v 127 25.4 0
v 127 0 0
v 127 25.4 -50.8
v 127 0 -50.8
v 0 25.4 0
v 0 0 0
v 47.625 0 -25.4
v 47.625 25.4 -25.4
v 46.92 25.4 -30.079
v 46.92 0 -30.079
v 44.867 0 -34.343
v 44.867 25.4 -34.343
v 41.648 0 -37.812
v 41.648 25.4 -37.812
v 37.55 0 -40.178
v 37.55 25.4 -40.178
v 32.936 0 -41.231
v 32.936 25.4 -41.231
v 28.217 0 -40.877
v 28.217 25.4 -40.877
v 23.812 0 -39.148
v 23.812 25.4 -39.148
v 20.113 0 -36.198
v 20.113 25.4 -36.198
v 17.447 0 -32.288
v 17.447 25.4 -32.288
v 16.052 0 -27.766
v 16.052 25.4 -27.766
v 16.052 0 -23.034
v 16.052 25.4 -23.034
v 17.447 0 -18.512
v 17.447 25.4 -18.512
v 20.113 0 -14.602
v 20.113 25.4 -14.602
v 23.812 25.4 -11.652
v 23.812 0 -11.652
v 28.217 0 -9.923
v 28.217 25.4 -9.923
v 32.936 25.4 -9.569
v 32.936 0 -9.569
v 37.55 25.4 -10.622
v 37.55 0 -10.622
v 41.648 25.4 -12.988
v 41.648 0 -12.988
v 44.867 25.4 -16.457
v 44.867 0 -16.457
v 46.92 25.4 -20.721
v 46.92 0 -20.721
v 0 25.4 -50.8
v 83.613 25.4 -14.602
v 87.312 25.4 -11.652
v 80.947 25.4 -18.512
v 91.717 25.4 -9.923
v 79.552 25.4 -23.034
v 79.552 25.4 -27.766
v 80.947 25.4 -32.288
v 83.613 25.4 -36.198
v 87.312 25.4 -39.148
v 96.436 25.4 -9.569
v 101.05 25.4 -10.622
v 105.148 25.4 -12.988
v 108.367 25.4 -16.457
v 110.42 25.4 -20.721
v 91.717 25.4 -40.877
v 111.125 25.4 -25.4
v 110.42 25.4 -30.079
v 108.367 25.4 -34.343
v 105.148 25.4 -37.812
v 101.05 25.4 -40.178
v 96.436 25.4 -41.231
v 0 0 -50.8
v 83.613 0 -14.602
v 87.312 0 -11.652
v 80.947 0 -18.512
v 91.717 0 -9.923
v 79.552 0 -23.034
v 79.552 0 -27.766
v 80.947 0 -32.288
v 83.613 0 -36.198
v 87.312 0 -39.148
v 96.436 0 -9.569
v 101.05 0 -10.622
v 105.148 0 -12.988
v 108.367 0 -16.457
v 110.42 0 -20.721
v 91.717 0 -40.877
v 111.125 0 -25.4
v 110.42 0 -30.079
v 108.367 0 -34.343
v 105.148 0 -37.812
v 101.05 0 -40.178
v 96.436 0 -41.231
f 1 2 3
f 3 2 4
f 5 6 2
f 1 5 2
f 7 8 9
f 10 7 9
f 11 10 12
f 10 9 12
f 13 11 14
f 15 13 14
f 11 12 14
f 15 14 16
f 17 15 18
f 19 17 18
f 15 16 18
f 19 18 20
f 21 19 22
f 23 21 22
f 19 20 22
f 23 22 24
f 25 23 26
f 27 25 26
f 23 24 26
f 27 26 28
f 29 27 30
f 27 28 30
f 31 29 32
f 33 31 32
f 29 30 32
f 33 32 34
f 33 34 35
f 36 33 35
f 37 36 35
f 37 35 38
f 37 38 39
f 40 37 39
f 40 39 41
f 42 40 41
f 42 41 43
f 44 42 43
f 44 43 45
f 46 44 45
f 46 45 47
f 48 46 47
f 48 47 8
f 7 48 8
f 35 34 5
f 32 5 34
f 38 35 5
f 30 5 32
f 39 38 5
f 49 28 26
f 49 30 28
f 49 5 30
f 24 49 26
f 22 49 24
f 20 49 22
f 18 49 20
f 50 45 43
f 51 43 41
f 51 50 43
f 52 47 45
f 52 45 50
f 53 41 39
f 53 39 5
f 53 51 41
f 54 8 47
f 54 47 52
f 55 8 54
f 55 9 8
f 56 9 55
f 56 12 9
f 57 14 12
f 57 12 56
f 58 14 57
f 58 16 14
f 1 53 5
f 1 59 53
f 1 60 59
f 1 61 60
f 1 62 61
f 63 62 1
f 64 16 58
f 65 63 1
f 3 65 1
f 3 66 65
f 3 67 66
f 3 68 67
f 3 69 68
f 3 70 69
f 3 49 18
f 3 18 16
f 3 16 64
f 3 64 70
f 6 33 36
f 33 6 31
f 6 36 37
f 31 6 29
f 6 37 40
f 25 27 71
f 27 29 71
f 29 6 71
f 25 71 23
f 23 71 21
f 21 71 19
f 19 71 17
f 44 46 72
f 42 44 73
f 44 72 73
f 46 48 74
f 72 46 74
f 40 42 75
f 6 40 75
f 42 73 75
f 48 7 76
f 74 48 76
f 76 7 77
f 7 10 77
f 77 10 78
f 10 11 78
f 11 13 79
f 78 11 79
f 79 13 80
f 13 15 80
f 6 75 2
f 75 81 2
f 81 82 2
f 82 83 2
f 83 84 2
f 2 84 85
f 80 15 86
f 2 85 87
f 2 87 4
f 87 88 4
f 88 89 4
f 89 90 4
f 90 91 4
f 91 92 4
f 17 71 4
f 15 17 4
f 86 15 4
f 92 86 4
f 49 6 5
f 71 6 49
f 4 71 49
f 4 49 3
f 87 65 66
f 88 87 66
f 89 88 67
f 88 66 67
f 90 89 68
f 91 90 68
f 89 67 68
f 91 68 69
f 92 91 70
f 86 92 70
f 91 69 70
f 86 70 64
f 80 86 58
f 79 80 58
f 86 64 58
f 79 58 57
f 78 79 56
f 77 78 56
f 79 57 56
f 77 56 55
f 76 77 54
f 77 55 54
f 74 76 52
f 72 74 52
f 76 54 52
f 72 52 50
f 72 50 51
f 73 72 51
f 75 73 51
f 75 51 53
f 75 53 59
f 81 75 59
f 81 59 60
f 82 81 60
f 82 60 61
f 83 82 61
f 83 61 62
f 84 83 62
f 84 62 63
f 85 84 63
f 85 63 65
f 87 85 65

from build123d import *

# Parameters (mm, degrees)
SKETCH1_W           = 127
SKETCH1_H           = 50.8
BOSS_EXTRUDE1_DEPTH = 25.4
SKETCH2_R           = 15.875
CUT_EXTRUDE1_DEPTH  = 26.4


with BuildPart() as part:
    # Sketch1 → Boss-Extrude1 (new body)
    with BuildSketch(Plane(origin=(0, 0, 0), x_dir=(1, 0, 0), z_dir=(0, 1, 0))):
        with Locations((63.5, 25.4)):
            Rectangle(SKETCH1_W, SKETCH1_H)
    extrude(amount=BOSS_EXTRUDE1_DEPTH)

    # Sketch2 → Cut-Extrude1 (cut, through all)
    with BuildSketch(Plane(origin=(0, 25.4, 0), x_dir=(1, 0, 0), z_dir=(0, 1, 0))):
        with Locations((31.75, 25.4)):
            Circle(SKETCH2_R)
        with Locations((95.25, 25.4)):
            Circle(SKETCH2_R)
    extrude(amount=-CUT_EXTRUDE1_DEPTH, mode=Mode.SUBTRACT)


solid = part.part
